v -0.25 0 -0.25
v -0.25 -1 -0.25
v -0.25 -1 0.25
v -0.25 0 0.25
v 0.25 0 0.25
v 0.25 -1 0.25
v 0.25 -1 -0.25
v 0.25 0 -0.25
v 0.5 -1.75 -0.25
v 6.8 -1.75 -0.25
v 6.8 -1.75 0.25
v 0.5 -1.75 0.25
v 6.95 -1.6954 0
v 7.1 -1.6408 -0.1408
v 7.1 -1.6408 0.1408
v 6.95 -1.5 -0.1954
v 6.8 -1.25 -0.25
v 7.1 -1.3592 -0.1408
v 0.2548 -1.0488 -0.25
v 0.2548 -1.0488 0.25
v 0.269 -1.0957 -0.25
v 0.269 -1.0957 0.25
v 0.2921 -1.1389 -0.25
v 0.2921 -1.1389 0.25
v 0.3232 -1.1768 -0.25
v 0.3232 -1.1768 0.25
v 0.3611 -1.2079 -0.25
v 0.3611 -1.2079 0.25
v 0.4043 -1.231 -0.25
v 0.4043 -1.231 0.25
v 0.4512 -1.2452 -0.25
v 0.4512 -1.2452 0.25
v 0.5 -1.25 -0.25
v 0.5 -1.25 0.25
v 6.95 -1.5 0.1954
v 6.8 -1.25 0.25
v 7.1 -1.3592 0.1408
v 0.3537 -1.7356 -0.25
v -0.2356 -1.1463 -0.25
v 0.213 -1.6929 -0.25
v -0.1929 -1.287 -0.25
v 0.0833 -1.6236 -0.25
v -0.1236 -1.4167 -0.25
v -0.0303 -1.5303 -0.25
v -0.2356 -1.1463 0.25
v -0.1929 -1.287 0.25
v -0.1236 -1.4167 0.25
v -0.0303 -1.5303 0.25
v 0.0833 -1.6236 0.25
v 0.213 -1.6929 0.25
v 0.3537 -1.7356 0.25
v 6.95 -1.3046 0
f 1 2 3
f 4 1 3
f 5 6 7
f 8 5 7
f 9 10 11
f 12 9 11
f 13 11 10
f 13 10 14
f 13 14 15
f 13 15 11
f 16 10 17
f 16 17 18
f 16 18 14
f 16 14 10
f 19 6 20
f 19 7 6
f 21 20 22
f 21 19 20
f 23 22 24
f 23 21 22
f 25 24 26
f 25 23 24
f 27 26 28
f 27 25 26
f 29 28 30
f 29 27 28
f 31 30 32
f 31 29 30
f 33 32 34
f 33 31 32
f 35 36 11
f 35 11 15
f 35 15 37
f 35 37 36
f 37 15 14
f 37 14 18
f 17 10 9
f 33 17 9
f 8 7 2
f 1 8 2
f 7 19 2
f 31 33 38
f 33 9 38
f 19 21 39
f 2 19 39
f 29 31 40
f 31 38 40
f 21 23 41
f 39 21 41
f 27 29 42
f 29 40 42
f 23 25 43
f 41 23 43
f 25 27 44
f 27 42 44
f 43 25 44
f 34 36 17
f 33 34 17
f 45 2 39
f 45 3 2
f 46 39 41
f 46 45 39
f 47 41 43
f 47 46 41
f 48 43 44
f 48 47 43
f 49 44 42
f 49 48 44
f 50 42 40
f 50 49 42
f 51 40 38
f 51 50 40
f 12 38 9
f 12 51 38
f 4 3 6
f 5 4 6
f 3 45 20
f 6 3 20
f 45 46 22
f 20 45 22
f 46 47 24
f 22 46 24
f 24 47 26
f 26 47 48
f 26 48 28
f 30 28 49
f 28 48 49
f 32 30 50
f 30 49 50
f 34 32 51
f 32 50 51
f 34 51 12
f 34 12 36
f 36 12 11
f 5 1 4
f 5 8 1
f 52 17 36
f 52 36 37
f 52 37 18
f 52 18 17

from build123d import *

# Parameters (mm, degrees)
SKETCH1_W           = 0.5
SKETCH1_H           = 0.5
SKETCH4_W           = 0.5
SKETCH4_H           = 0.5
BOSS_EXTRUDE1_DEPTH = 0.3
BOSS_EXTRUDE1_TAPER = 20


with BuildPart() as part:
    # Sweep1: sweep along a path in Sketch2
    with BuildLine(Plane.XY) as sweep1_path:
        Line((0, 0), (0, -1))
        ThreePointArc((0, -1), (0.146446609, -1.353553391), (0.5, -1.5))
        Line((0.5, -1.5), (6.8, -1.5))
    # Sketch1 → Sweep1 (sweep)
    with BuildSketch(Plane(origin=(0, 0, 0), x_dir=(1, 0, 0), z_dir=(0, 1, 0))):
        Rectangle(SKETCH1_W, SKETCH1_H)
    sweep(path=sweep1_path.line)

    # Sketch4 → Boss-Extrude1 (add)
    with BuildSketch(Plane(origin=(6.8, 0, 0), x_dir=(0, 0, -1), z_dir=(1, 0, 0))):
        with Locations((0, -1.5)):
            Rectangle(SKETCH4_W, SKETCH4_H)
    extrude(amount=BOSS_EXTRUDE1_DEPTH, taper=BOSS_EXTRUDE1_TAPER)


solid = part.part
